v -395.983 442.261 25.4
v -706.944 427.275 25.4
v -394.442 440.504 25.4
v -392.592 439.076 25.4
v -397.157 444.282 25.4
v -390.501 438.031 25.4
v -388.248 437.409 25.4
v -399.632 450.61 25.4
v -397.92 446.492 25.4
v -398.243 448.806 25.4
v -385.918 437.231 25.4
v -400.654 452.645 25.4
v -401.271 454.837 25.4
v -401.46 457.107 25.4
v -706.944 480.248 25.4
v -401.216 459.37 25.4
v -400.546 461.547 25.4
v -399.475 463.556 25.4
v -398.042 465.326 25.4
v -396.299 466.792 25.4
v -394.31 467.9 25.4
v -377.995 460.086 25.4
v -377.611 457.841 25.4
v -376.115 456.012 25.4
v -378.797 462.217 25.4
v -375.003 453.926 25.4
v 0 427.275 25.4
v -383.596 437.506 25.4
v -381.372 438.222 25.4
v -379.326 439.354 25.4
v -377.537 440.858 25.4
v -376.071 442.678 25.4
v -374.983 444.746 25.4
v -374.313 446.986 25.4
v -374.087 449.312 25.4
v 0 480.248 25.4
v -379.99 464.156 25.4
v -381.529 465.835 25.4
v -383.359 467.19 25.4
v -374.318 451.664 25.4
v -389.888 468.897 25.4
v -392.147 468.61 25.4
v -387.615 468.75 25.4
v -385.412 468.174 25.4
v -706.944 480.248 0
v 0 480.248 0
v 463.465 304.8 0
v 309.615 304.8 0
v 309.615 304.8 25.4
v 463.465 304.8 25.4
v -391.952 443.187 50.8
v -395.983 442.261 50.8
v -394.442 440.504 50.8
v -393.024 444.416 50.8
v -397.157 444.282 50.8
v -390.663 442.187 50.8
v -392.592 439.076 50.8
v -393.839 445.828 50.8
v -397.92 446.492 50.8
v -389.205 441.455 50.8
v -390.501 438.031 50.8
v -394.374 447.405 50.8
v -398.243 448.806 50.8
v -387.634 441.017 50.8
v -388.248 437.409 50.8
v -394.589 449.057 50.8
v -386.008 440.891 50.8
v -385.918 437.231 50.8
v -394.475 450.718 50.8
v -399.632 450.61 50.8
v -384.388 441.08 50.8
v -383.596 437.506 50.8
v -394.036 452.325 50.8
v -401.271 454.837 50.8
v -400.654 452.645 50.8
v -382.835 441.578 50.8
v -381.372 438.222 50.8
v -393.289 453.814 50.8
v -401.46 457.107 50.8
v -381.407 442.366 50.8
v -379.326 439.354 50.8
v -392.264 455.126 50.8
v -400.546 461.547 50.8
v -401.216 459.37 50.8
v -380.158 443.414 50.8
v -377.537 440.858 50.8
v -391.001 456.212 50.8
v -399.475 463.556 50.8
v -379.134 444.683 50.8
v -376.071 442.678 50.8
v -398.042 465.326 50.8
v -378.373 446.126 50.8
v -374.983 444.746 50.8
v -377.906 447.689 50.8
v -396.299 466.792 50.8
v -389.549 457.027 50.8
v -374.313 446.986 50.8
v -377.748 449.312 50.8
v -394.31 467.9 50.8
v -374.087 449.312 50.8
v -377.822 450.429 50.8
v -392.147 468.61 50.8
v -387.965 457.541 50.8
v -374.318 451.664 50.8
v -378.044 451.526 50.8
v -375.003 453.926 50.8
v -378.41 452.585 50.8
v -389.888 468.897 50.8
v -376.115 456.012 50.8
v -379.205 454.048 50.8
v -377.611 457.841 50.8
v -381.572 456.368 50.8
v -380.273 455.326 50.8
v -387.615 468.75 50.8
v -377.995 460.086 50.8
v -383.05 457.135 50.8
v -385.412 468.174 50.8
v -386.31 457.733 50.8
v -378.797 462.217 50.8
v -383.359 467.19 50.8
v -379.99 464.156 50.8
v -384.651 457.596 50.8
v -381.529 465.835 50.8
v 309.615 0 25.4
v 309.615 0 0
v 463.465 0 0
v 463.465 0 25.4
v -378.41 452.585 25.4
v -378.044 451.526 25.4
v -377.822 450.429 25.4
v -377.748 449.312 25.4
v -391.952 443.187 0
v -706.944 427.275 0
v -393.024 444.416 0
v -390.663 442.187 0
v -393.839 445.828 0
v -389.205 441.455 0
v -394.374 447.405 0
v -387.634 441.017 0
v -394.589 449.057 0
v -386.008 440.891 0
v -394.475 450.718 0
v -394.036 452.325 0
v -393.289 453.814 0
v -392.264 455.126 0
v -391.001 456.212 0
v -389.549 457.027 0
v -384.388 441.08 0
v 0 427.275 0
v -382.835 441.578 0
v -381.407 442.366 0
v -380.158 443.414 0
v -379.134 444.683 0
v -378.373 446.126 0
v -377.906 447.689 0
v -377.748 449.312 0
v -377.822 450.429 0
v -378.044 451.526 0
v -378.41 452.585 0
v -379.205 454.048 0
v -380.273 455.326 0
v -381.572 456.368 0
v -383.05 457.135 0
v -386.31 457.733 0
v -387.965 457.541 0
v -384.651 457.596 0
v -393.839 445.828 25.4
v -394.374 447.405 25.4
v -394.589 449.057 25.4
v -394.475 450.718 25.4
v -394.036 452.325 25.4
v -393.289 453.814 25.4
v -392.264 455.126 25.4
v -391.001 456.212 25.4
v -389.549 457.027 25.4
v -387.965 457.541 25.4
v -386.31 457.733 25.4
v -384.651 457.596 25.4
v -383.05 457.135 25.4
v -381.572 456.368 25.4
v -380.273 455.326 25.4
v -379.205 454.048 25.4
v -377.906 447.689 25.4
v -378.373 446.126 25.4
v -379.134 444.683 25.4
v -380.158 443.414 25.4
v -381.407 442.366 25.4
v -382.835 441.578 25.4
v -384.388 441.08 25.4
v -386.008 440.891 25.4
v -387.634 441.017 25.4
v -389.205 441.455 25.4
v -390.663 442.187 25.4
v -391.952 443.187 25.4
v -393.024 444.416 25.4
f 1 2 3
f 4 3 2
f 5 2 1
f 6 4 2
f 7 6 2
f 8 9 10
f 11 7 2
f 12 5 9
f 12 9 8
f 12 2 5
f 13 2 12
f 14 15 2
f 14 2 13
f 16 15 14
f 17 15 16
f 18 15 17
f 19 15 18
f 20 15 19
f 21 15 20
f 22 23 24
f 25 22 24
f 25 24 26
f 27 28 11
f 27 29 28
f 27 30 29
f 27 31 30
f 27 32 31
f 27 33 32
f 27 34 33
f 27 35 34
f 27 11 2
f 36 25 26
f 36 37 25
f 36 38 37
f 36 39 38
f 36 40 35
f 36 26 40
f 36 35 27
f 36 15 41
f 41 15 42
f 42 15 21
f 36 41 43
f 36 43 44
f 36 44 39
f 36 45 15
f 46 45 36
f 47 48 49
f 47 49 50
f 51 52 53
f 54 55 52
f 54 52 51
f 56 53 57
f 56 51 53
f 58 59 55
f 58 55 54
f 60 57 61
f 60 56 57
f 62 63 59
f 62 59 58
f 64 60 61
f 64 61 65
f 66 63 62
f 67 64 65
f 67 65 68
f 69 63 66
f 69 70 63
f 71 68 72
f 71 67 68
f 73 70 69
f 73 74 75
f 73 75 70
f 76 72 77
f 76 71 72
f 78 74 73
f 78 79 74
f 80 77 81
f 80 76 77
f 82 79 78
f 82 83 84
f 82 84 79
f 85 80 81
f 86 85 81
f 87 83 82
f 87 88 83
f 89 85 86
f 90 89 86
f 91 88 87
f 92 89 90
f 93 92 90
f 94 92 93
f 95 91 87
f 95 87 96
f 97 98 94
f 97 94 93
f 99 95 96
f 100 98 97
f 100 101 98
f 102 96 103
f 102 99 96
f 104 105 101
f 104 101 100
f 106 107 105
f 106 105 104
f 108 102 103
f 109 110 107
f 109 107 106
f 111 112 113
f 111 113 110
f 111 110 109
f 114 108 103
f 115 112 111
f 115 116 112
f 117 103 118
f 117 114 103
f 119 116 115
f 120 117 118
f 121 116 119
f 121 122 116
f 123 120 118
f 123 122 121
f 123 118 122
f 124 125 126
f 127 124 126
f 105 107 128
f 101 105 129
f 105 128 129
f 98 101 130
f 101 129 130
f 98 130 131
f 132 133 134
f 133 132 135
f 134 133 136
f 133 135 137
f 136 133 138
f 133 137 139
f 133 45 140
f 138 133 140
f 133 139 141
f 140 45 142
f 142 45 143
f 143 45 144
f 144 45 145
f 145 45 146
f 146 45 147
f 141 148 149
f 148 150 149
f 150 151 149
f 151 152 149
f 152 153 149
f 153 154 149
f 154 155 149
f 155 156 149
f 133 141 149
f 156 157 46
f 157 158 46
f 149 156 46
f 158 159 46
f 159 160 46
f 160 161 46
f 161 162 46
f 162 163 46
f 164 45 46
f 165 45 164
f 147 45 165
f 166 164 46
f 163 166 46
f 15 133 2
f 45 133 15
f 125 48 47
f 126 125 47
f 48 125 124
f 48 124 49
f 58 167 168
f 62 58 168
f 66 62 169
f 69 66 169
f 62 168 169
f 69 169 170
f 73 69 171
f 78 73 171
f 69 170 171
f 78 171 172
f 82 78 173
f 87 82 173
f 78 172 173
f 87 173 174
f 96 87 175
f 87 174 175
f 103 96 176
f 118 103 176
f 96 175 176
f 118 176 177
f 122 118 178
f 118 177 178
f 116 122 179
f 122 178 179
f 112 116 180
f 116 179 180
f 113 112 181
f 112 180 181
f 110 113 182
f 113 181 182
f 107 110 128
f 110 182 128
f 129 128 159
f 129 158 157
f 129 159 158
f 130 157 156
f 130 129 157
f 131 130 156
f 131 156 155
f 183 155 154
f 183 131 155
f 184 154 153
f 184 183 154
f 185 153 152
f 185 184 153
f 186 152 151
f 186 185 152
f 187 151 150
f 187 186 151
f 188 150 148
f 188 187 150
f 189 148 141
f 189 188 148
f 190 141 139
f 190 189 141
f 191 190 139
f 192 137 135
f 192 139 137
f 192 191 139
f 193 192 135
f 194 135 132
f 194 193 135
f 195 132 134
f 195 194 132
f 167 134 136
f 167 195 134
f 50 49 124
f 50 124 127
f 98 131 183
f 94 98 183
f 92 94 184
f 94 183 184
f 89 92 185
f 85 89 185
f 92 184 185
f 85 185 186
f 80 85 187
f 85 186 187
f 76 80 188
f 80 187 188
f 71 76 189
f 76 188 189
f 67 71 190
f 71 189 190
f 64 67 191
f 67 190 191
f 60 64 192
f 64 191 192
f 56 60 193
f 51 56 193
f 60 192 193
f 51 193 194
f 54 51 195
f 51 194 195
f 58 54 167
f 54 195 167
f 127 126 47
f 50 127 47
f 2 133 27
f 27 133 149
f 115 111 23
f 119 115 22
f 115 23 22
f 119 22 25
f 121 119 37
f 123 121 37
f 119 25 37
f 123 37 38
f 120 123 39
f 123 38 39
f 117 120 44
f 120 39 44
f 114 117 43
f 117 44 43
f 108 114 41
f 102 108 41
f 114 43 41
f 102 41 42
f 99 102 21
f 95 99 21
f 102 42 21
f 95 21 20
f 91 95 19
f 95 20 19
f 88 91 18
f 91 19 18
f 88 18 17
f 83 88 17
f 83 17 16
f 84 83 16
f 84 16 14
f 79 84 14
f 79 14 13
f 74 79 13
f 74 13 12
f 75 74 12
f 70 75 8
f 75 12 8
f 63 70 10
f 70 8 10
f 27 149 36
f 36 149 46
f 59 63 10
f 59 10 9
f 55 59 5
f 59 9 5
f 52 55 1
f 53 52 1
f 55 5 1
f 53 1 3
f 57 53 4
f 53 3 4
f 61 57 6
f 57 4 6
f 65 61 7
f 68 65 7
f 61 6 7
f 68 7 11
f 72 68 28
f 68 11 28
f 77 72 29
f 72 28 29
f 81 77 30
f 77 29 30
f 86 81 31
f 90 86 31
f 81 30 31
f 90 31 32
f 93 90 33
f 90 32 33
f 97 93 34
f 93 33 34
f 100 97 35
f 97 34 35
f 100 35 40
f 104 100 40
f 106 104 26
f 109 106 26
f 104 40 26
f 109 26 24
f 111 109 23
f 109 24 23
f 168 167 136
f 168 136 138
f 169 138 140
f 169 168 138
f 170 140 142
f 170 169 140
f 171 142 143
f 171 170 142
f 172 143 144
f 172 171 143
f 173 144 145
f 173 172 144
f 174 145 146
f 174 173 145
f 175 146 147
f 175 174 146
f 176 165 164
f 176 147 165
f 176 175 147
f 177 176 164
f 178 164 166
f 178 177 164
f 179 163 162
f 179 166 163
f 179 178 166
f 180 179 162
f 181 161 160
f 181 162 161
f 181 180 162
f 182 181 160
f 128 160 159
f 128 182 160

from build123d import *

# Parameters (mm, degrees)
F0_W     = 153.8493943154
F0_H     = 304.8
F1_DEPTH = 25.4
F0_W_2   = 706.9441376255
F0_H_2   = 52.9727586547
F3_DEPTH = 25.4
F4_DEPTH = 25.401


with BuildPart() as f1:
    # F0 (on Top) → F1 (new body)
    with BuildSketch(Plane.XY):
        with Locations((386.5399363272, 152.4)):
            Rectangle(F0_W, F0_H)
    extrude(amount=F1_DEPTH)


with BuildPart() as f1b:
    # F0 (on Top) → F1, piece 2 (new body)
    with BuildSketch(Plane.XY):
        with Locations((-353.4720688128, 453.7613283162)):
            Rectangle(F0_W_2, F0_H_2)
    extrude(amount=F1_DEPTH)

    # F2 (on face) → F3 (join)
    with BuildSketch(Plane.XY.offset(25.4)):
        with BuildLine():
            ThreePointArc((-398.2430654439, 448.8063495925), (-385.9175506779, 437.2312984411), (-374.0871281156, 449.3119120598))
            ThreePointArc((-374.0871281156, 449.3119120598), (-375.0028523933, 453.926163523), (-377.6112297338, 457.8410371057))
            ThreePointArc((-377.6112297338, 457.8410371057), (-377.5868901469, 457.4014250502), (-377.5787732731, 456.9612145424))
            ThreePointArc((-377.5787732731, 456.9612145424), (-377.7883318284, 454.7339144409), (-378.4096523512, 452.584788726))
            ThreePointArc((-378.4096523512, 452.584788726), (-377.9148878404, 450.9814800644), (-377.7477553681, 449.3119120598))
            ThreePointArc((-377.7477553681, 449.3119120598), (-384.3882488939, 441.0799796659), (-393.8388565209, 445.8283352427))
            ThreePointArc((-393.8388565209, 445.8283352427), (-396.2088026565, 447.0691200413), (-398.2430654439, 448.8063495925))
        make_face()
        with BuildLine():
            ThreePointArc((-377.5787732731, 456.9612145424), (-377.5868901469, 457.4014250502), (-377.6112297338, 457.8410371057))
            ThreePointArc((-377.6112297338, 457.8410371057), (-391.0173039622, 460.3804508209), (-398.2430654439, 448.8063495925))
            ThreePointArc((-398.2430654439, 448.8063495925), (-396.2088026565, 447.0691200413), (-393.8388565209, 445.8283352427))
            ThreePointArc((-393.8388565209, 445.8283352427), (-389.5489289884, 457.0272334378), (-378.4096523512, 452.584788726))
            ThreePointArc((-378.4096523512, 452.584788726), (-377.7883318284, 454.7339144409), (-377.5787732731, 456.9612145424))
        make_face()
        with BuildLine():
            ThreePointArc((-398.2430654439, 448.8063495925), (-391.0173039622, 460.3804508209), (-377.6112297338, 457.8410371057))
            ThreePointArc((-377.6112297338, 457.8410371057), (-394.3099707415, 467.899666061), (-398.2430654439, 448.8063495925))
        make_face()
    extrude(amount=F3_DEPTH)

    # F4 (cut, through all): a face of the model
    f4_faces = [f1b.faces().sort_by_distance(p)[0] for p in [
        (-386.1703872681, 449.3119120598, 25.4),
    ]]
    extrude(f4_faces, amount=-F4_DEPTH, mode=Mode.SUBTRACT)


solid = Compound([f1.part, f1b.part])
